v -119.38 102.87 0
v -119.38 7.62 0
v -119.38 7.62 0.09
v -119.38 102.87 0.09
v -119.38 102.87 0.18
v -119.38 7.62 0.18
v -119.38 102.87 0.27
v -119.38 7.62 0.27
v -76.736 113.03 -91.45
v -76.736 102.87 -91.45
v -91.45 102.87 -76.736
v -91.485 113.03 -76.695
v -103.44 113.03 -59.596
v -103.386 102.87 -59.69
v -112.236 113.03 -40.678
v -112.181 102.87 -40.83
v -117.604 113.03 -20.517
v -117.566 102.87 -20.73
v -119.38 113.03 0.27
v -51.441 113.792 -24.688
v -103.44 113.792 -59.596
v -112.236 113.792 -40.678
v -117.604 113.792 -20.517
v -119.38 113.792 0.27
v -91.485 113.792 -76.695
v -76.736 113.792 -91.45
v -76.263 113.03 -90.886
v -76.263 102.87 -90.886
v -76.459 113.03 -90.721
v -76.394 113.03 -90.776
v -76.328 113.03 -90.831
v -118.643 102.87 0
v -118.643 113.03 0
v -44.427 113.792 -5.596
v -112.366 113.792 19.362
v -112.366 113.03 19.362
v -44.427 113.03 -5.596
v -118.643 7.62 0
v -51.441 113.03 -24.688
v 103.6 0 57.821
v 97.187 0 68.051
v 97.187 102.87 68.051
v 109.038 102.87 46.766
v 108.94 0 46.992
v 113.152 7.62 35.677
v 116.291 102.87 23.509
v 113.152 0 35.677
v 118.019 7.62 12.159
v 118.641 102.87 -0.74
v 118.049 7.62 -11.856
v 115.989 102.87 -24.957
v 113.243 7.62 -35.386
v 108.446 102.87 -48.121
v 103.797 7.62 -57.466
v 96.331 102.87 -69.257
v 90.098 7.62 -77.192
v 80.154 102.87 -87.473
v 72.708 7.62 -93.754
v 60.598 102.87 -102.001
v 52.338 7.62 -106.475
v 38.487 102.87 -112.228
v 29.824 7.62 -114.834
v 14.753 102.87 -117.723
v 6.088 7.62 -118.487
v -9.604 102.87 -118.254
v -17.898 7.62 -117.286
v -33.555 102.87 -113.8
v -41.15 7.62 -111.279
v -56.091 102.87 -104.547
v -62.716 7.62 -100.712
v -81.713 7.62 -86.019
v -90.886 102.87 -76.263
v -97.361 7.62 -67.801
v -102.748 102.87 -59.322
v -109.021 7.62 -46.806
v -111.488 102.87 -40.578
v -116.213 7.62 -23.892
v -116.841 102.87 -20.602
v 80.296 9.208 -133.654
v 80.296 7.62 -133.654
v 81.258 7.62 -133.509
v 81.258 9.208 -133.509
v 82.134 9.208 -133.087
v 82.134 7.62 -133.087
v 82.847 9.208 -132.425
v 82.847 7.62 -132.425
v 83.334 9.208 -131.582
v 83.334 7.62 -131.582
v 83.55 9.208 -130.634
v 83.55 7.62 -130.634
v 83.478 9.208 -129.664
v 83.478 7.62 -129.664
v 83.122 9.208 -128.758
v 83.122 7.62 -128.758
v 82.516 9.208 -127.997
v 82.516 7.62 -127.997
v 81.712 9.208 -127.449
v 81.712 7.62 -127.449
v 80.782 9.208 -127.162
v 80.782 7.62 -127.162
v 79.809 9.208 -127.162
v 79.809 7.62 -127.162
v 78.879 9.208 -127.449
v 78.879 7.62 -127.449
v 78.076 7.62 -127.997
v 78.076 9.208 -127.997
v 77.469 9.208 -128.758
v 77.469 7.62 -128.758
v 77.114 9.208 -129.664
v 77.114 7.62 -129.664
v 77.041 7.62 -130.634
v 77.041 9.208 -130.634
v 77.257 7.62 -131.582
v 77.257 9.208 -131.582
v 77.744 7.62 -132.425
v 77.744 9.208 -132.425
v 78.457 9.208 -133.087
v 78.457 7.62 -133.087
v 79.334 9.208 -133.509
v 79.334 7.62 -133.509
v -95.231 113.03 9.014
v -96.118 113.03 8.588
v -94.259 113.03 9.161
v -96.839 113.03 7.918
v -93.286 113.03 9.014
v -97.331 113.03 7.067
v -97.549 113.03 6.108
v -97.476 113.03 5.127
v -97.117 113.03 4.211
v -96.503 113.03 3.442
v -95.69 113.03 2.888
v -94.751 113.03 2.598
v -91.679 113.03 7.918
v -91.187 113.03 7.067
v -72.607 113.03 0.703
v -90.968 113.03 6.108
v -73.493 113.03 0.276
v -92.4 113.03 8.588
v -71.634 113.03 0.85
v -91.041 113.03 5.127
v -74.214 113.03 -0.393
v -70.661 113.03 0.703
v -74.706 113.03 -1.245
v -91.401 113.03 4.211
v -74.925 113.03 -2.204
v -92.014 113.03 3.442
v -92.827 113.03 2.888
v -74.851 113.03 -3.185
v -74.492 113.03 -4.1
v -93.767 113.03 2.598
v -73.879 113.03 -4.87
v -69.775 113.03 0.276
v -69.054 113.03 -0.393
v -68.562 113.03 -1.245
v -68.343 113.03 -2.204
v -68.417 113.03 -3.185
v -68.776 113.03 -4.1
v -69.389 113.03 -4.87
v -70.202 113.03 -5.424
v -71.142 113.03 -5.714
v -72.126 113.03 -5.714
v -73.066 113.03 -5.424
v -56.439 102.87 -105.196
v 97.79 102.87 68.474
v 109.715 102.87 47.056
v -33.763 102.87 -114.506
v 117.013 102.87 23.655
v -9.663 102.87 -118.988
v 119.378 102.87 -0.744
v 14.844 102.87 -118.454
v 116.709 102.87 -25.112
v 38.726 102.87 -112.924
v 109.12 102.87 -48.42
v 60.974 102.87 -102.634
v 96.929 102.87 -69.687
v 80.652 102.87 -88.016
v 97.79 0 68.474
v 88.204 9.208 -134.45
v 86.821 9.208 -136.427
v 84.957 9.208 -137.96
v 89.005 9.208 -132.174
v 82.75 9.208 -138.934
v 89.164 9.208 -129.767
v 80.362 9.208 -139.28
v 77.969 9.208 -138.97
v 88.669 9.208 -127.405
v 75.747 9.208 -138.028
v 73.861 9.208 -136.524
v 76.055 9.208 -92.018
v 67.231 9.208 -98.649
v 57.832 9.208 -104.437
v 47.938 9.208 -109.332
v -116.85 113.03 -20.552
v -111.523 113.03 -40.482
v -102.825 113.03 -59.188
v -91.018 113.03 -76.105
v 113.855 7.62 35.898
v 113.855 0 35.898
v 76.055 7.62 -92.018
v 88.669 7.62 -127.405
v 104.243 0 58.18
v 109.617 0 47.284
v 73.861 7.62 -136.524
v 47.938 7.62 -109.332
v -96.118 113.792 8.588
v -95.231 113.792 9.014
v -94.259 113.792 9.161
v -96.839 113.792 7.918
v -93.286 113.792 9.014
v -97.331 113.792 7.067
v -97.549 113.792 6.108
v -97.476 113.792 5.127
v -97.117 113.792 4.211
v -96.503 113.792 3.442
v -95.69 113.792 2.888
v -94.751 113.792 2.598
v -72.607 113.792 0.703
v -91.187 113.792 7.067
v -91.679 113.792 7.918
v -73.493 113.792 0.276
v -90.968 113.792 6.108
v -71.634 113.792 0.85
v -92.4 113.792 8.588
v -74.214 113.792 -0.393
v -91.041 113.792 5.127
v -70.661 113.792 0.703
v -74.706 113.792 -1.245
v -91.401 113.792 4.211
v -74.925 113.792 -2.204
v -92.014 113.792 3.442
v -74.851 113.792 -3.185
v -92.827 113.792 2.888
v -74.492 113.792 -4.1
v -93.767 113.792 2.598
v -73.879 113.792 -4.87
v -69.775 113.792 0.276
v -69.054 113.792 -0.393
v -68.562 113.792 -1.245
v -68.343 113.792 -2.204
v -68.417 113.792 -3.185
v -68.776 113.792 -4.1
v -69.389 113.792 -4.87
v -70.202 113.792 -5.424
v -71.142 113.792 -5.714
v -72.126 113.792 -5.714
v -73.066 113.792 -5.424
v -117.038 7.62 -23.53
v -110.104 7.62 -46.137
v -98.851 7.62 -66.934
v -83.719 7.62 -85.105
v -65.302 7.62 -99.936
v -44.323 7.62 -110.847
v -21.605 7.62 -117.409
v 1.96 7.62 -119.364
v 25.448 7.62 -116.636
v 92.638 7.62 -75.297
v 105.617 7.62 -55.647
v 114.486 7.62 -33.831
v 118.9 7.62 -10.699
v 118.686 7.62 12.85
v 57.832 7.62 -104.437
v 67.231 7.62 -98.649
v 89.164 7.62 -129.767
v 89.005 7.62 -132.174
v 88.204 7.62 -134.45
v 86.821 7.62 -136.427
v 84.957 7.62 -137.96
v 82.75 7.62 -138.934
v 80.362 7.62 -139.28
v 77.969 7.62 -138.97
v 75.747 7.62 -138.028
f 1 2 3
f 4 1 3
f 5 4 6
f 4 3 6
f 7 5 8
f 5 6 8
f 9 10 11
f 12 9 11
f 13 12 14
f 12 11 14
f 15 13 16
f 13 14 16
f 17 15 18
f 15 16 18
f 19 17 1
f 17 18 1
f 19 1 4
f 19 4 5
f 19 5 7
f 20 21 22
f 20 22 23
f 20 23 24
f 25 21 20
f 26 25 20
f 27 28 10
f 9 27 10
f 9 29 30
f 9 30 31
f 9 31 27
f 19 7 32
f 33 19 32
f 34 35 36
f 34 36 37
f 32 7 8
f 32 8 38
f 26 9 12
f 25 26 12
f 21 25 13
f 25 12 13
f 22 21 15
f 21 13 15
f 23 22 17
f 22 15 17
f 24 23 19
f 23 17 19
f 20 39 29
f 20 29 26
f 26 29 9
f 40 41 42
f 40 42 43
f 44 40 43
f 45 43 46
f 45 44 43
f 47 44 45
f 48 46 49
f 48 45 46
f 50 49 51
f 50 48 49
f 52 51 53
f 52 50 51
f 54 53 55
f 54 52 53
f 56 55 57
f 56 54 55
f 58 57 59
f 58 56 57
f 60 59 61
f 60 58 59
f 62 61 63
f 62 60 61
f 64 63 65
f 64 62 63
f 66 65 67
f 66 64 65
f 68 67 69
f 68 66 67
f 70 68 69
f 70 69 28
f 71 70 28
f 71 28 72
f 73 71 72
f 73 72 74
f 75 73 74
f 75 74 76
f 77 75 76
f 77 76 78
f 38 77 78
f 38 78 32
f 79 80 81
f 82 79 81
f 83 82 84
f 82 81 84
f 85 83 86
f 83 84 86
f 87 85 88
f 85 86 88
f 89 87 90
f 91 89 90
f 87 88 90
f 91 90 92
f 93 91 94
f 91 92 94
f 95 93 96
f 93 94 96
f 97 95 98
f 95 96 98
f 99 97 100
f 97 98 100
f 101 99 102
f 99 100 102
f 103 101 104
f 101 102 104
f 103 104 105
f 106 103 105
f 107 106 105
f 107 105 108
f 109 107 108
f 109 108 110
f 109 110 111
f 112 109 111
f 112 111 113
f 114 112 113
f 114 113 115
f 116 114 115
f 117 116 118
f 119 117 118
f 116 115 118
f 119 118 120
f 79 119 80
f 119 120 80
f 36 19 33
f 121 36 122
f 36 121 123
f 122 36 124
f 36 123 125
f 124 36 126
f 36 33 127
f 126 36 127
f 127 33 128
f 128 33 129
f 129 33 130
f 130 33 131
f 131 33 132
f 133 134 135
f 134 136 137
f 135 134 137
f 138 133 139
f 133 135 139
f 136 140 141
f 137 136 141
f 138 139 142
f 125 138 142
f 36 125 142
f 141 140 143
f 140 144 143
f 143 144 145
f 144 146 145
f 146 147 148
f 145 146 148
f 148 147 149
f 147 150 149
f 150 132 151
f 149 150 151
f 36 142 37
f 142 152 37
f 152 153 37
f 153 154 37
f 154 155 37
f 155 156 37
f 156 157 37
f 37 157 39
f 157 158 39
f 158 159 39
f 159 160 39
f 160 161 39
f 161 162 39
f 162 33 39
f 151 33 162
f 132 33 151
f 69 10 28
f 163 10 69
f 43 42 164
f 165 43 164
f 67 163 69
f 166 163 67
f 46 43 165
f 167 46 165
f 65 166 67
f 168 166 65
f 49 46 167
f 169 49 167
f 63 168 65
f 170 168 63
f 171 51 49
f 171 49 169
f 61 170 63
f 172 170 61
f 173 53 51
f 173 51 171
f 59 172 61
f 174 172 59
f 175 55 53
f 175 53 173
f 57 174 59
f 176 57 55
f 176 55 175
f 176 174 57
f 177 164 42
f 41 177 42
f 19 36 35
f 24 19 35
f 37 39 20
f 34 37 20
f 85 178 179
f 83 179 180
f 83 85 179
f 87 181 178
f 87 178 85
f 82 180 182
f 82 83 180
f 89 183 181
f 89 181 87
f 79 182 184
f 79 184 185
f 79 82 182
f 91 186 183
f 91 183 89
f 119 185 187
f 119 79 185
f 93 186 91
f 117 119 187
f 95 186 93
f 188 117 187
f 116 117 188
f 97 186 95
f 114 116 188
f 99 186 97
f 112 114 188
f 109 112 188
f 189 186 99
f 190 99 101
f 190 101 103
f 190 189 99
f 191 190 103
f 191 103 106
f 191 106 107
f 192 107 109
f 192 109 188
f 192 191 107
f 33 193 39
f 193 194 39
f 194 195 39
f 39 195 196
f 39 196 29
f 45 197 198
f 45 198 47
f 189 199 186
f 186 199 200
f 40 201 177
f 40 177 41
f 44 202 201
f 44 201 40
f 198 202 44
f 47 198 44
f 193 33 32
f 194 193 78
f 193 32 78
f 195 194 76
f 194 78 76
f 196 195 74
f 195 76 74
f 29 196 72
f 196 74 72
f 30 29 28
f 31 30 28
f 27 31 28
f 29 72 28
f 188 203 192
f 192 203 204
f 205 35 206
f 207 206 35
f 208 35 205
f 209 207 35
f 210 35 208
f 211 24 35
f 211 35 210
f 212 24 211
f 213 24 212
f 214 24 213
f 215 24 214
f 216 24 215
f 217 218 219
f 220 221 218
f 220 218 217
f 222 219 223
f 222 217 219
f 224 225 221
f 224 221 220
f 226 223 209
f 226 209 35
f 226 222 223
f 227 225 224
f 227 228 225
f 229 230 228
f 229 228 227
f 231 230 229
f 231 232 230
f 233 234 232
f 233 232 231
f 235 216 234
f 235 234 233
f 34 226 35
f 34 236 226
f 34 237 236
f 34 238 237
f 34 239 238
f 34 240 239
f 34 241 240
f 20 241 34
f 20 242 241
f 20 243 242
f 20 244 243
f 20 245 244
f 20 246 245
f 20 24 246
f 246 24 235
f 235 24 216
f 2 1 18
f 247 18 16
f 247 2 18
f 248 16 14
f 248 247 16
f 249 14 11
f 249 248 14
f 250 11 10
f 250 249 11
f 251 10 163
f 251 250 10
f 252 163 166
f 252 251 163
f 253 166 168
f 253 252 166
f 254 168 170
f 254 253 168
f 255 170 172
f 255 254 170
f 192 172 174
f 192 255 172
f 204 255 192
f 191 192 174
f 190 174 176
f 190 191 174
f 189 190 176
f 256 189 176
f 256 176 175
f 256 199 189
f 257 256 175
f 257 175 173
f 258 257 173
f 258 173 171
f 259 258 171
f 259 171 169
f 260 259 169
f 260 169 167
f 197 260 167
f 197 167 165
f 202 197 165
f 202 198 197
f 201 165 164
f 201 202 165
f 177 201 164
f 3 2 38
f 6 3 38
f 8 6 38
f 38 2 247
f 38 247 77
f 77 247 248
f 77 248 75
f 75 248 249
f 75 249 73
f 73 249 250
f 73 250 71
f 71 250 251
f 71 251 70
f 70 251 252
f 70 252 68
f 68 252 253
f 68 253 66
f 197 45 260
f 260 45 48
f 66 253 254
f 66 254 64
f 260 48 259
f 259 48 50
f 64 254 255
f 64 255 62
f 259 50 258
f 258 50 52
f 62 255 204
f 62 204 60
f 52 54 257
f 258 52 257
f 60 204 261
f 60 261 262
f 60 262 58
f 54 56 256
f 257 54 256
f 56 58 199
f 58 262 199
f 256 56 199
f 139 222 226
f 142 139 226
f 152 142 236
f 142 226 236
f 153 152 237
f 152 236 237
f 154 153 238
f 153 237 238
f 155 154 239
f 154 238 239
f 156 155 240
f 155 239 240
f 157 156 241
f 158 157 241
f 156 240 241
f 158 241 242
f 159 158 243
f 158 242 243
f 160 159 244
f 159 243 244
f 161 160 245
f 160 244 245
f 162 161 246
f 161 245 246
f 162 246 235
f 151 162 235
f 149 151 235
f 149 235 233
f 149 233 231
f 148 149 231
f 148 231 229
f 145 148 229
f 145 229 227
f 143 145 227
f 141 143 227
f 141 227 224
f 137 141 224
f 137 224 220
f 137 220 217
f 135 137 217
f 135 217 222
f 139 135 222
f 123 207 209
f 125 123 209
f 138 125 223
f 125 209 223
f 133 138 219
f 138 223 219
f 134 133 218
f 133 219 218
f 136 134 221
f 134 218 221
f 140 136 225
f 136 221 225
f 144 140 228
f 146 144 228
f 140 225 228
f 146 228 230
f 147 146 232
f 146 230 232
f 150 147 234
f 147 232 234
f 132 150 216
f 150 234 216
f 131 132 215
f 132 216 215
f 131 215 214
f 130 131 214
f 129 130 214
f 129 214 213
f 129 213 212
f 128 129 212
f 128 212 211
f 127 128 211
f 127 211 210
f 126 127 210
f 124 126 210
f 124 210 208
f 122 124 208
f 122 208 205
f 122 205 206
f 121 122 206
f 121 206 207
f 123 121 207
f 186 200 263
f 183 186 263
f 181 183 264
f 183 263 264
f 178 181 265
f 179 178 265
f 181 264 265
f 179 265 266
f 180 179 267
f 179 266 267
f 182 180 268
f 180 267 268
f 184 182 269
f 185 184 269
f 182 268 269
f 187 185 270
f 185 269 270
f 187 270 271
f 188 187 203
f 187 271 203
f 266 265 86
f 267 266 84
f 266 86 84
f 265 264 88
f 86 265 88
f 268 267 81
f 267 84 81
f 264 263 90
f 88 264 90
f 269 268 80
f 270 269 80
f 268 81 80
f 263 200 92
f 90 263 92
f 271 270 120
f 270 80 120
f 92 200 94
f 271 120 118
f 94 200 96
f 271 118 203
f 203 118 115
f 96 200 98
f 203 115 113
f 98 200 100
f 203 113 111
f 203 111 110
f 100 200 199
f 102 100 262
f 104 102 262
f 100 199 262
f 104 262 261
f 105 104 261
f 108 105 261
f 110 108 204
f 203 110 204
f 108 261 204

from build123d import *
from build123d.topology import SkipClean

# Parameters (mm, degrees)
BASE_FLANGE1_DEPTH   = 102.87
CUT_EXTRUDE1_START   = -7.62
CUT_EXTRUDE1_DEPTH   = 7.62
BOSS_EXTRUDE5_START  = -95.25
BOSS_EXTRUDE5_DEPTH  = 95.25
BOSS_EXTRUDE6_DEPTH  = 10.16
BOSS_EXTRUDE7_DEPTH  = 0.762
SKETCH12_W           = 72.378245623
SKETCH12_H           = 0.762
BOSS_EXTRUDE8_DEPTH  = 20.33854962
SKETCH13_R           = 3.3
CUT_EXTRUDE2_DEPTH   = 204.597121983
SKETCH15_R           = 3.2639
BOSS_EXTRUDE10_DEPTH = 1.5875


# Read off the part's stored shape, not the designer's step: Cut-Extrude1
# Sheet-metal steps are written as plain solids
with BuildPart() as part:
    # Sketch2 → Base-Flange1 (new body)
    with BuildSketch(Plane(origin=(0, 0, 0), x_dir=(1, 0, 0), z_dir=(0, 1, 0))):
        with BuildLine():
            ThreePointArc((-119.38, 0), (35.898258345, 113.85472958), (97.790371047, -68.473554972))
            Line((97.790371047, -68.473554972), (97.186983651, -68.051058569))
            ThreePointArc((97.186983651, -68.051058569), (35.676758453, 113.152221674), (-118.6434, 0))
            Line((-118.6434, 0), (-119.38, 0))
        make_face()
    extrude(amount=BASE_FLANGE1_DEPTH)

    # Cut-Extrude1 outline → Cut-Extrude1 (cut)
    with BuildSketch(Plane.XZ.offset(CUT_EXTRUDE1_START)):
        with BuildLine():
            ThreePointArc((-119.38, 0), (18.160489843, -117.990597119), (113.85472958, 35.898258345))
            Line((113.85472958, 35.898258345), (113.152221674, 35.676758453))
            ThreePointArc((113.152221674, 35.676758453), (18.048435757, -117.262570031), (-118.6434, 0))
            Line((-118.6434, 0), (-119.38, 0))
        make_face()
    extrude(amount=CUT_EXTRUDE1_DEPTH, mode=Mode.SUBTRACT)

    # Sketch9 → Boss-Extrude5 (add)
    with BuildSketch(Plane(origin=(0, 102.87, 0), x_dir=(1, 0, 0), z_dir=(0, 1, 0)).offset(BOSS_EXTRUDE5_START)):
        with BuildLine():
            Line((-119.379693576, -0.270484204), (-118.6434, 0))
            Line((-118.6434, 0), (-119.38, 0))
            ThreePointArc((-119.38, 0), (-119.379923394, -0.135242189), (-119.379693576, -0.270484204))
        make_face()
    extrude(amount=BOSS_EXTRUDE5_DEPTH)

    # Sketch10 → Boss-Extrude6 (add)
    with SkipClean():  # the faces are left unmerged after this step: merging them gives an invalid solid
        with BuildSketch(Plane(origin=(0, 102.87, 0), x_dir=(1, 0, 0), z_dir=(0, 1, 0))):
            with BuildLine():
                Line((-119.379693576, -0.270484204), (-118.6434, 0))
                ThreePointArc((-118.6434, 0), (-107.527437301, 50.140867475), (-76.262507491, 90.886117283))
                Line((-76.262507491, 90.886117283), (-76.735984844, 91.45038562))
                ThreePointArc((-76.735984844, 91.45038562), (-108.252110006, 50.329564663), (-119.379693576, -0.270484204))
            make_face()
        extrude(amount=BOSS_EXTRUDE6_DEPTH)

    # Sketch11 → Boss-Extrude7 (add)
    with SkipClean():  # the faces are left unmerged after this step: merging them gives an invalid solid
        with BuildSketch(Plane(origin=(0, 113.03, 0), x_dir=(1, 0, 0), z_dir=(0, 1, 0))):
            with BuildLine():
                Line((-119.379693576, -0.270484204), (-51.440692331, 24.687531528))
                Line((-51.440692331, 24.687531528), (-76.735984844, 91.45038562))
                ThreePointArc((-76.735984844, 91.45038562), (-108.252110006, 50.329564663), (-119.379693576, -0.270484204))
            make_face()
        extrude(amount=BOSS_EXTRUDE7_DEPTH)

    # Sketch12 → Boss-Extrude8 (add)
    with SkipClean():  # the faces are left unmerged after this step: merging them gives an invalid solid
        with BuildSketch(Plane(origin=(-14.107419738, 0, -38.402251904), x_dir=(0.9386660406079884, 0, -0.3448275862069655), z_dir=(0.3448275862069655, 0, 0.9386660406079884))):
            with Locations((-75.961811901, 113.411)):
                Rectangle(SKETCH12_W, SKETCH12_H)
        extrude(amount=BOSS_EXTRUDE8_DEPTH)

    # Sketch13 → Cut-Extrude2 (cut, through all)
    with SkipClean():  # the faces are left unmerged after this step: merging them gives an invalid solid
        with BuildSketch(Plane(origin=(0, 113.792, 0), x_dir=(1, 0, 0), z_dir=(0, 1, 0))):
            with Locations(Location((-94.258662261, -5.860928581, 0), (0, 0, 270))):
                Circle(SKETCH13_R)
            with Locations(Location((-71.633967235, 2.450493285, 0), (0, 0, 270))):
                Circle(SKETCH13_R)
        extrude(amount=-CUT_EXTRUDE2_DEPTH, mode=Mode.SUBTRACT)

    # Sketch15 → Boss-Extrude10 (add)
    with SkipClean():  # the faces are left unmerged after this step: merging them gives an invalid solid
        with BuildSketch(Plane.XZ.offset(-7.62)):
            with BuildLine():
                Line((76.054879624, -92.017605302), (88.669451617, -127.404882133))
                ThreePointArc((88.669451617, -127.404882133), (84.957156503, -137.959730204), (73.860989671, -136.524099874))
                Line((73.860989671, -136.524099874), (47.938477772, -109.332002401))
                ThreePointArc((47.938477772, -109.332002401), (62.598204897, -101.651606695), (76.054879624, -92.017605302))
            make_face()
            with Locations(Location((80.295588053, -130.389929705, 0), (0, 0, 270))):
                Circle(SKETCH15_R, mode=Mode.SUBTRACT)
        extrude(amount=-BOSS_EXTRUDE10_DEPTH)


solid = part.part
